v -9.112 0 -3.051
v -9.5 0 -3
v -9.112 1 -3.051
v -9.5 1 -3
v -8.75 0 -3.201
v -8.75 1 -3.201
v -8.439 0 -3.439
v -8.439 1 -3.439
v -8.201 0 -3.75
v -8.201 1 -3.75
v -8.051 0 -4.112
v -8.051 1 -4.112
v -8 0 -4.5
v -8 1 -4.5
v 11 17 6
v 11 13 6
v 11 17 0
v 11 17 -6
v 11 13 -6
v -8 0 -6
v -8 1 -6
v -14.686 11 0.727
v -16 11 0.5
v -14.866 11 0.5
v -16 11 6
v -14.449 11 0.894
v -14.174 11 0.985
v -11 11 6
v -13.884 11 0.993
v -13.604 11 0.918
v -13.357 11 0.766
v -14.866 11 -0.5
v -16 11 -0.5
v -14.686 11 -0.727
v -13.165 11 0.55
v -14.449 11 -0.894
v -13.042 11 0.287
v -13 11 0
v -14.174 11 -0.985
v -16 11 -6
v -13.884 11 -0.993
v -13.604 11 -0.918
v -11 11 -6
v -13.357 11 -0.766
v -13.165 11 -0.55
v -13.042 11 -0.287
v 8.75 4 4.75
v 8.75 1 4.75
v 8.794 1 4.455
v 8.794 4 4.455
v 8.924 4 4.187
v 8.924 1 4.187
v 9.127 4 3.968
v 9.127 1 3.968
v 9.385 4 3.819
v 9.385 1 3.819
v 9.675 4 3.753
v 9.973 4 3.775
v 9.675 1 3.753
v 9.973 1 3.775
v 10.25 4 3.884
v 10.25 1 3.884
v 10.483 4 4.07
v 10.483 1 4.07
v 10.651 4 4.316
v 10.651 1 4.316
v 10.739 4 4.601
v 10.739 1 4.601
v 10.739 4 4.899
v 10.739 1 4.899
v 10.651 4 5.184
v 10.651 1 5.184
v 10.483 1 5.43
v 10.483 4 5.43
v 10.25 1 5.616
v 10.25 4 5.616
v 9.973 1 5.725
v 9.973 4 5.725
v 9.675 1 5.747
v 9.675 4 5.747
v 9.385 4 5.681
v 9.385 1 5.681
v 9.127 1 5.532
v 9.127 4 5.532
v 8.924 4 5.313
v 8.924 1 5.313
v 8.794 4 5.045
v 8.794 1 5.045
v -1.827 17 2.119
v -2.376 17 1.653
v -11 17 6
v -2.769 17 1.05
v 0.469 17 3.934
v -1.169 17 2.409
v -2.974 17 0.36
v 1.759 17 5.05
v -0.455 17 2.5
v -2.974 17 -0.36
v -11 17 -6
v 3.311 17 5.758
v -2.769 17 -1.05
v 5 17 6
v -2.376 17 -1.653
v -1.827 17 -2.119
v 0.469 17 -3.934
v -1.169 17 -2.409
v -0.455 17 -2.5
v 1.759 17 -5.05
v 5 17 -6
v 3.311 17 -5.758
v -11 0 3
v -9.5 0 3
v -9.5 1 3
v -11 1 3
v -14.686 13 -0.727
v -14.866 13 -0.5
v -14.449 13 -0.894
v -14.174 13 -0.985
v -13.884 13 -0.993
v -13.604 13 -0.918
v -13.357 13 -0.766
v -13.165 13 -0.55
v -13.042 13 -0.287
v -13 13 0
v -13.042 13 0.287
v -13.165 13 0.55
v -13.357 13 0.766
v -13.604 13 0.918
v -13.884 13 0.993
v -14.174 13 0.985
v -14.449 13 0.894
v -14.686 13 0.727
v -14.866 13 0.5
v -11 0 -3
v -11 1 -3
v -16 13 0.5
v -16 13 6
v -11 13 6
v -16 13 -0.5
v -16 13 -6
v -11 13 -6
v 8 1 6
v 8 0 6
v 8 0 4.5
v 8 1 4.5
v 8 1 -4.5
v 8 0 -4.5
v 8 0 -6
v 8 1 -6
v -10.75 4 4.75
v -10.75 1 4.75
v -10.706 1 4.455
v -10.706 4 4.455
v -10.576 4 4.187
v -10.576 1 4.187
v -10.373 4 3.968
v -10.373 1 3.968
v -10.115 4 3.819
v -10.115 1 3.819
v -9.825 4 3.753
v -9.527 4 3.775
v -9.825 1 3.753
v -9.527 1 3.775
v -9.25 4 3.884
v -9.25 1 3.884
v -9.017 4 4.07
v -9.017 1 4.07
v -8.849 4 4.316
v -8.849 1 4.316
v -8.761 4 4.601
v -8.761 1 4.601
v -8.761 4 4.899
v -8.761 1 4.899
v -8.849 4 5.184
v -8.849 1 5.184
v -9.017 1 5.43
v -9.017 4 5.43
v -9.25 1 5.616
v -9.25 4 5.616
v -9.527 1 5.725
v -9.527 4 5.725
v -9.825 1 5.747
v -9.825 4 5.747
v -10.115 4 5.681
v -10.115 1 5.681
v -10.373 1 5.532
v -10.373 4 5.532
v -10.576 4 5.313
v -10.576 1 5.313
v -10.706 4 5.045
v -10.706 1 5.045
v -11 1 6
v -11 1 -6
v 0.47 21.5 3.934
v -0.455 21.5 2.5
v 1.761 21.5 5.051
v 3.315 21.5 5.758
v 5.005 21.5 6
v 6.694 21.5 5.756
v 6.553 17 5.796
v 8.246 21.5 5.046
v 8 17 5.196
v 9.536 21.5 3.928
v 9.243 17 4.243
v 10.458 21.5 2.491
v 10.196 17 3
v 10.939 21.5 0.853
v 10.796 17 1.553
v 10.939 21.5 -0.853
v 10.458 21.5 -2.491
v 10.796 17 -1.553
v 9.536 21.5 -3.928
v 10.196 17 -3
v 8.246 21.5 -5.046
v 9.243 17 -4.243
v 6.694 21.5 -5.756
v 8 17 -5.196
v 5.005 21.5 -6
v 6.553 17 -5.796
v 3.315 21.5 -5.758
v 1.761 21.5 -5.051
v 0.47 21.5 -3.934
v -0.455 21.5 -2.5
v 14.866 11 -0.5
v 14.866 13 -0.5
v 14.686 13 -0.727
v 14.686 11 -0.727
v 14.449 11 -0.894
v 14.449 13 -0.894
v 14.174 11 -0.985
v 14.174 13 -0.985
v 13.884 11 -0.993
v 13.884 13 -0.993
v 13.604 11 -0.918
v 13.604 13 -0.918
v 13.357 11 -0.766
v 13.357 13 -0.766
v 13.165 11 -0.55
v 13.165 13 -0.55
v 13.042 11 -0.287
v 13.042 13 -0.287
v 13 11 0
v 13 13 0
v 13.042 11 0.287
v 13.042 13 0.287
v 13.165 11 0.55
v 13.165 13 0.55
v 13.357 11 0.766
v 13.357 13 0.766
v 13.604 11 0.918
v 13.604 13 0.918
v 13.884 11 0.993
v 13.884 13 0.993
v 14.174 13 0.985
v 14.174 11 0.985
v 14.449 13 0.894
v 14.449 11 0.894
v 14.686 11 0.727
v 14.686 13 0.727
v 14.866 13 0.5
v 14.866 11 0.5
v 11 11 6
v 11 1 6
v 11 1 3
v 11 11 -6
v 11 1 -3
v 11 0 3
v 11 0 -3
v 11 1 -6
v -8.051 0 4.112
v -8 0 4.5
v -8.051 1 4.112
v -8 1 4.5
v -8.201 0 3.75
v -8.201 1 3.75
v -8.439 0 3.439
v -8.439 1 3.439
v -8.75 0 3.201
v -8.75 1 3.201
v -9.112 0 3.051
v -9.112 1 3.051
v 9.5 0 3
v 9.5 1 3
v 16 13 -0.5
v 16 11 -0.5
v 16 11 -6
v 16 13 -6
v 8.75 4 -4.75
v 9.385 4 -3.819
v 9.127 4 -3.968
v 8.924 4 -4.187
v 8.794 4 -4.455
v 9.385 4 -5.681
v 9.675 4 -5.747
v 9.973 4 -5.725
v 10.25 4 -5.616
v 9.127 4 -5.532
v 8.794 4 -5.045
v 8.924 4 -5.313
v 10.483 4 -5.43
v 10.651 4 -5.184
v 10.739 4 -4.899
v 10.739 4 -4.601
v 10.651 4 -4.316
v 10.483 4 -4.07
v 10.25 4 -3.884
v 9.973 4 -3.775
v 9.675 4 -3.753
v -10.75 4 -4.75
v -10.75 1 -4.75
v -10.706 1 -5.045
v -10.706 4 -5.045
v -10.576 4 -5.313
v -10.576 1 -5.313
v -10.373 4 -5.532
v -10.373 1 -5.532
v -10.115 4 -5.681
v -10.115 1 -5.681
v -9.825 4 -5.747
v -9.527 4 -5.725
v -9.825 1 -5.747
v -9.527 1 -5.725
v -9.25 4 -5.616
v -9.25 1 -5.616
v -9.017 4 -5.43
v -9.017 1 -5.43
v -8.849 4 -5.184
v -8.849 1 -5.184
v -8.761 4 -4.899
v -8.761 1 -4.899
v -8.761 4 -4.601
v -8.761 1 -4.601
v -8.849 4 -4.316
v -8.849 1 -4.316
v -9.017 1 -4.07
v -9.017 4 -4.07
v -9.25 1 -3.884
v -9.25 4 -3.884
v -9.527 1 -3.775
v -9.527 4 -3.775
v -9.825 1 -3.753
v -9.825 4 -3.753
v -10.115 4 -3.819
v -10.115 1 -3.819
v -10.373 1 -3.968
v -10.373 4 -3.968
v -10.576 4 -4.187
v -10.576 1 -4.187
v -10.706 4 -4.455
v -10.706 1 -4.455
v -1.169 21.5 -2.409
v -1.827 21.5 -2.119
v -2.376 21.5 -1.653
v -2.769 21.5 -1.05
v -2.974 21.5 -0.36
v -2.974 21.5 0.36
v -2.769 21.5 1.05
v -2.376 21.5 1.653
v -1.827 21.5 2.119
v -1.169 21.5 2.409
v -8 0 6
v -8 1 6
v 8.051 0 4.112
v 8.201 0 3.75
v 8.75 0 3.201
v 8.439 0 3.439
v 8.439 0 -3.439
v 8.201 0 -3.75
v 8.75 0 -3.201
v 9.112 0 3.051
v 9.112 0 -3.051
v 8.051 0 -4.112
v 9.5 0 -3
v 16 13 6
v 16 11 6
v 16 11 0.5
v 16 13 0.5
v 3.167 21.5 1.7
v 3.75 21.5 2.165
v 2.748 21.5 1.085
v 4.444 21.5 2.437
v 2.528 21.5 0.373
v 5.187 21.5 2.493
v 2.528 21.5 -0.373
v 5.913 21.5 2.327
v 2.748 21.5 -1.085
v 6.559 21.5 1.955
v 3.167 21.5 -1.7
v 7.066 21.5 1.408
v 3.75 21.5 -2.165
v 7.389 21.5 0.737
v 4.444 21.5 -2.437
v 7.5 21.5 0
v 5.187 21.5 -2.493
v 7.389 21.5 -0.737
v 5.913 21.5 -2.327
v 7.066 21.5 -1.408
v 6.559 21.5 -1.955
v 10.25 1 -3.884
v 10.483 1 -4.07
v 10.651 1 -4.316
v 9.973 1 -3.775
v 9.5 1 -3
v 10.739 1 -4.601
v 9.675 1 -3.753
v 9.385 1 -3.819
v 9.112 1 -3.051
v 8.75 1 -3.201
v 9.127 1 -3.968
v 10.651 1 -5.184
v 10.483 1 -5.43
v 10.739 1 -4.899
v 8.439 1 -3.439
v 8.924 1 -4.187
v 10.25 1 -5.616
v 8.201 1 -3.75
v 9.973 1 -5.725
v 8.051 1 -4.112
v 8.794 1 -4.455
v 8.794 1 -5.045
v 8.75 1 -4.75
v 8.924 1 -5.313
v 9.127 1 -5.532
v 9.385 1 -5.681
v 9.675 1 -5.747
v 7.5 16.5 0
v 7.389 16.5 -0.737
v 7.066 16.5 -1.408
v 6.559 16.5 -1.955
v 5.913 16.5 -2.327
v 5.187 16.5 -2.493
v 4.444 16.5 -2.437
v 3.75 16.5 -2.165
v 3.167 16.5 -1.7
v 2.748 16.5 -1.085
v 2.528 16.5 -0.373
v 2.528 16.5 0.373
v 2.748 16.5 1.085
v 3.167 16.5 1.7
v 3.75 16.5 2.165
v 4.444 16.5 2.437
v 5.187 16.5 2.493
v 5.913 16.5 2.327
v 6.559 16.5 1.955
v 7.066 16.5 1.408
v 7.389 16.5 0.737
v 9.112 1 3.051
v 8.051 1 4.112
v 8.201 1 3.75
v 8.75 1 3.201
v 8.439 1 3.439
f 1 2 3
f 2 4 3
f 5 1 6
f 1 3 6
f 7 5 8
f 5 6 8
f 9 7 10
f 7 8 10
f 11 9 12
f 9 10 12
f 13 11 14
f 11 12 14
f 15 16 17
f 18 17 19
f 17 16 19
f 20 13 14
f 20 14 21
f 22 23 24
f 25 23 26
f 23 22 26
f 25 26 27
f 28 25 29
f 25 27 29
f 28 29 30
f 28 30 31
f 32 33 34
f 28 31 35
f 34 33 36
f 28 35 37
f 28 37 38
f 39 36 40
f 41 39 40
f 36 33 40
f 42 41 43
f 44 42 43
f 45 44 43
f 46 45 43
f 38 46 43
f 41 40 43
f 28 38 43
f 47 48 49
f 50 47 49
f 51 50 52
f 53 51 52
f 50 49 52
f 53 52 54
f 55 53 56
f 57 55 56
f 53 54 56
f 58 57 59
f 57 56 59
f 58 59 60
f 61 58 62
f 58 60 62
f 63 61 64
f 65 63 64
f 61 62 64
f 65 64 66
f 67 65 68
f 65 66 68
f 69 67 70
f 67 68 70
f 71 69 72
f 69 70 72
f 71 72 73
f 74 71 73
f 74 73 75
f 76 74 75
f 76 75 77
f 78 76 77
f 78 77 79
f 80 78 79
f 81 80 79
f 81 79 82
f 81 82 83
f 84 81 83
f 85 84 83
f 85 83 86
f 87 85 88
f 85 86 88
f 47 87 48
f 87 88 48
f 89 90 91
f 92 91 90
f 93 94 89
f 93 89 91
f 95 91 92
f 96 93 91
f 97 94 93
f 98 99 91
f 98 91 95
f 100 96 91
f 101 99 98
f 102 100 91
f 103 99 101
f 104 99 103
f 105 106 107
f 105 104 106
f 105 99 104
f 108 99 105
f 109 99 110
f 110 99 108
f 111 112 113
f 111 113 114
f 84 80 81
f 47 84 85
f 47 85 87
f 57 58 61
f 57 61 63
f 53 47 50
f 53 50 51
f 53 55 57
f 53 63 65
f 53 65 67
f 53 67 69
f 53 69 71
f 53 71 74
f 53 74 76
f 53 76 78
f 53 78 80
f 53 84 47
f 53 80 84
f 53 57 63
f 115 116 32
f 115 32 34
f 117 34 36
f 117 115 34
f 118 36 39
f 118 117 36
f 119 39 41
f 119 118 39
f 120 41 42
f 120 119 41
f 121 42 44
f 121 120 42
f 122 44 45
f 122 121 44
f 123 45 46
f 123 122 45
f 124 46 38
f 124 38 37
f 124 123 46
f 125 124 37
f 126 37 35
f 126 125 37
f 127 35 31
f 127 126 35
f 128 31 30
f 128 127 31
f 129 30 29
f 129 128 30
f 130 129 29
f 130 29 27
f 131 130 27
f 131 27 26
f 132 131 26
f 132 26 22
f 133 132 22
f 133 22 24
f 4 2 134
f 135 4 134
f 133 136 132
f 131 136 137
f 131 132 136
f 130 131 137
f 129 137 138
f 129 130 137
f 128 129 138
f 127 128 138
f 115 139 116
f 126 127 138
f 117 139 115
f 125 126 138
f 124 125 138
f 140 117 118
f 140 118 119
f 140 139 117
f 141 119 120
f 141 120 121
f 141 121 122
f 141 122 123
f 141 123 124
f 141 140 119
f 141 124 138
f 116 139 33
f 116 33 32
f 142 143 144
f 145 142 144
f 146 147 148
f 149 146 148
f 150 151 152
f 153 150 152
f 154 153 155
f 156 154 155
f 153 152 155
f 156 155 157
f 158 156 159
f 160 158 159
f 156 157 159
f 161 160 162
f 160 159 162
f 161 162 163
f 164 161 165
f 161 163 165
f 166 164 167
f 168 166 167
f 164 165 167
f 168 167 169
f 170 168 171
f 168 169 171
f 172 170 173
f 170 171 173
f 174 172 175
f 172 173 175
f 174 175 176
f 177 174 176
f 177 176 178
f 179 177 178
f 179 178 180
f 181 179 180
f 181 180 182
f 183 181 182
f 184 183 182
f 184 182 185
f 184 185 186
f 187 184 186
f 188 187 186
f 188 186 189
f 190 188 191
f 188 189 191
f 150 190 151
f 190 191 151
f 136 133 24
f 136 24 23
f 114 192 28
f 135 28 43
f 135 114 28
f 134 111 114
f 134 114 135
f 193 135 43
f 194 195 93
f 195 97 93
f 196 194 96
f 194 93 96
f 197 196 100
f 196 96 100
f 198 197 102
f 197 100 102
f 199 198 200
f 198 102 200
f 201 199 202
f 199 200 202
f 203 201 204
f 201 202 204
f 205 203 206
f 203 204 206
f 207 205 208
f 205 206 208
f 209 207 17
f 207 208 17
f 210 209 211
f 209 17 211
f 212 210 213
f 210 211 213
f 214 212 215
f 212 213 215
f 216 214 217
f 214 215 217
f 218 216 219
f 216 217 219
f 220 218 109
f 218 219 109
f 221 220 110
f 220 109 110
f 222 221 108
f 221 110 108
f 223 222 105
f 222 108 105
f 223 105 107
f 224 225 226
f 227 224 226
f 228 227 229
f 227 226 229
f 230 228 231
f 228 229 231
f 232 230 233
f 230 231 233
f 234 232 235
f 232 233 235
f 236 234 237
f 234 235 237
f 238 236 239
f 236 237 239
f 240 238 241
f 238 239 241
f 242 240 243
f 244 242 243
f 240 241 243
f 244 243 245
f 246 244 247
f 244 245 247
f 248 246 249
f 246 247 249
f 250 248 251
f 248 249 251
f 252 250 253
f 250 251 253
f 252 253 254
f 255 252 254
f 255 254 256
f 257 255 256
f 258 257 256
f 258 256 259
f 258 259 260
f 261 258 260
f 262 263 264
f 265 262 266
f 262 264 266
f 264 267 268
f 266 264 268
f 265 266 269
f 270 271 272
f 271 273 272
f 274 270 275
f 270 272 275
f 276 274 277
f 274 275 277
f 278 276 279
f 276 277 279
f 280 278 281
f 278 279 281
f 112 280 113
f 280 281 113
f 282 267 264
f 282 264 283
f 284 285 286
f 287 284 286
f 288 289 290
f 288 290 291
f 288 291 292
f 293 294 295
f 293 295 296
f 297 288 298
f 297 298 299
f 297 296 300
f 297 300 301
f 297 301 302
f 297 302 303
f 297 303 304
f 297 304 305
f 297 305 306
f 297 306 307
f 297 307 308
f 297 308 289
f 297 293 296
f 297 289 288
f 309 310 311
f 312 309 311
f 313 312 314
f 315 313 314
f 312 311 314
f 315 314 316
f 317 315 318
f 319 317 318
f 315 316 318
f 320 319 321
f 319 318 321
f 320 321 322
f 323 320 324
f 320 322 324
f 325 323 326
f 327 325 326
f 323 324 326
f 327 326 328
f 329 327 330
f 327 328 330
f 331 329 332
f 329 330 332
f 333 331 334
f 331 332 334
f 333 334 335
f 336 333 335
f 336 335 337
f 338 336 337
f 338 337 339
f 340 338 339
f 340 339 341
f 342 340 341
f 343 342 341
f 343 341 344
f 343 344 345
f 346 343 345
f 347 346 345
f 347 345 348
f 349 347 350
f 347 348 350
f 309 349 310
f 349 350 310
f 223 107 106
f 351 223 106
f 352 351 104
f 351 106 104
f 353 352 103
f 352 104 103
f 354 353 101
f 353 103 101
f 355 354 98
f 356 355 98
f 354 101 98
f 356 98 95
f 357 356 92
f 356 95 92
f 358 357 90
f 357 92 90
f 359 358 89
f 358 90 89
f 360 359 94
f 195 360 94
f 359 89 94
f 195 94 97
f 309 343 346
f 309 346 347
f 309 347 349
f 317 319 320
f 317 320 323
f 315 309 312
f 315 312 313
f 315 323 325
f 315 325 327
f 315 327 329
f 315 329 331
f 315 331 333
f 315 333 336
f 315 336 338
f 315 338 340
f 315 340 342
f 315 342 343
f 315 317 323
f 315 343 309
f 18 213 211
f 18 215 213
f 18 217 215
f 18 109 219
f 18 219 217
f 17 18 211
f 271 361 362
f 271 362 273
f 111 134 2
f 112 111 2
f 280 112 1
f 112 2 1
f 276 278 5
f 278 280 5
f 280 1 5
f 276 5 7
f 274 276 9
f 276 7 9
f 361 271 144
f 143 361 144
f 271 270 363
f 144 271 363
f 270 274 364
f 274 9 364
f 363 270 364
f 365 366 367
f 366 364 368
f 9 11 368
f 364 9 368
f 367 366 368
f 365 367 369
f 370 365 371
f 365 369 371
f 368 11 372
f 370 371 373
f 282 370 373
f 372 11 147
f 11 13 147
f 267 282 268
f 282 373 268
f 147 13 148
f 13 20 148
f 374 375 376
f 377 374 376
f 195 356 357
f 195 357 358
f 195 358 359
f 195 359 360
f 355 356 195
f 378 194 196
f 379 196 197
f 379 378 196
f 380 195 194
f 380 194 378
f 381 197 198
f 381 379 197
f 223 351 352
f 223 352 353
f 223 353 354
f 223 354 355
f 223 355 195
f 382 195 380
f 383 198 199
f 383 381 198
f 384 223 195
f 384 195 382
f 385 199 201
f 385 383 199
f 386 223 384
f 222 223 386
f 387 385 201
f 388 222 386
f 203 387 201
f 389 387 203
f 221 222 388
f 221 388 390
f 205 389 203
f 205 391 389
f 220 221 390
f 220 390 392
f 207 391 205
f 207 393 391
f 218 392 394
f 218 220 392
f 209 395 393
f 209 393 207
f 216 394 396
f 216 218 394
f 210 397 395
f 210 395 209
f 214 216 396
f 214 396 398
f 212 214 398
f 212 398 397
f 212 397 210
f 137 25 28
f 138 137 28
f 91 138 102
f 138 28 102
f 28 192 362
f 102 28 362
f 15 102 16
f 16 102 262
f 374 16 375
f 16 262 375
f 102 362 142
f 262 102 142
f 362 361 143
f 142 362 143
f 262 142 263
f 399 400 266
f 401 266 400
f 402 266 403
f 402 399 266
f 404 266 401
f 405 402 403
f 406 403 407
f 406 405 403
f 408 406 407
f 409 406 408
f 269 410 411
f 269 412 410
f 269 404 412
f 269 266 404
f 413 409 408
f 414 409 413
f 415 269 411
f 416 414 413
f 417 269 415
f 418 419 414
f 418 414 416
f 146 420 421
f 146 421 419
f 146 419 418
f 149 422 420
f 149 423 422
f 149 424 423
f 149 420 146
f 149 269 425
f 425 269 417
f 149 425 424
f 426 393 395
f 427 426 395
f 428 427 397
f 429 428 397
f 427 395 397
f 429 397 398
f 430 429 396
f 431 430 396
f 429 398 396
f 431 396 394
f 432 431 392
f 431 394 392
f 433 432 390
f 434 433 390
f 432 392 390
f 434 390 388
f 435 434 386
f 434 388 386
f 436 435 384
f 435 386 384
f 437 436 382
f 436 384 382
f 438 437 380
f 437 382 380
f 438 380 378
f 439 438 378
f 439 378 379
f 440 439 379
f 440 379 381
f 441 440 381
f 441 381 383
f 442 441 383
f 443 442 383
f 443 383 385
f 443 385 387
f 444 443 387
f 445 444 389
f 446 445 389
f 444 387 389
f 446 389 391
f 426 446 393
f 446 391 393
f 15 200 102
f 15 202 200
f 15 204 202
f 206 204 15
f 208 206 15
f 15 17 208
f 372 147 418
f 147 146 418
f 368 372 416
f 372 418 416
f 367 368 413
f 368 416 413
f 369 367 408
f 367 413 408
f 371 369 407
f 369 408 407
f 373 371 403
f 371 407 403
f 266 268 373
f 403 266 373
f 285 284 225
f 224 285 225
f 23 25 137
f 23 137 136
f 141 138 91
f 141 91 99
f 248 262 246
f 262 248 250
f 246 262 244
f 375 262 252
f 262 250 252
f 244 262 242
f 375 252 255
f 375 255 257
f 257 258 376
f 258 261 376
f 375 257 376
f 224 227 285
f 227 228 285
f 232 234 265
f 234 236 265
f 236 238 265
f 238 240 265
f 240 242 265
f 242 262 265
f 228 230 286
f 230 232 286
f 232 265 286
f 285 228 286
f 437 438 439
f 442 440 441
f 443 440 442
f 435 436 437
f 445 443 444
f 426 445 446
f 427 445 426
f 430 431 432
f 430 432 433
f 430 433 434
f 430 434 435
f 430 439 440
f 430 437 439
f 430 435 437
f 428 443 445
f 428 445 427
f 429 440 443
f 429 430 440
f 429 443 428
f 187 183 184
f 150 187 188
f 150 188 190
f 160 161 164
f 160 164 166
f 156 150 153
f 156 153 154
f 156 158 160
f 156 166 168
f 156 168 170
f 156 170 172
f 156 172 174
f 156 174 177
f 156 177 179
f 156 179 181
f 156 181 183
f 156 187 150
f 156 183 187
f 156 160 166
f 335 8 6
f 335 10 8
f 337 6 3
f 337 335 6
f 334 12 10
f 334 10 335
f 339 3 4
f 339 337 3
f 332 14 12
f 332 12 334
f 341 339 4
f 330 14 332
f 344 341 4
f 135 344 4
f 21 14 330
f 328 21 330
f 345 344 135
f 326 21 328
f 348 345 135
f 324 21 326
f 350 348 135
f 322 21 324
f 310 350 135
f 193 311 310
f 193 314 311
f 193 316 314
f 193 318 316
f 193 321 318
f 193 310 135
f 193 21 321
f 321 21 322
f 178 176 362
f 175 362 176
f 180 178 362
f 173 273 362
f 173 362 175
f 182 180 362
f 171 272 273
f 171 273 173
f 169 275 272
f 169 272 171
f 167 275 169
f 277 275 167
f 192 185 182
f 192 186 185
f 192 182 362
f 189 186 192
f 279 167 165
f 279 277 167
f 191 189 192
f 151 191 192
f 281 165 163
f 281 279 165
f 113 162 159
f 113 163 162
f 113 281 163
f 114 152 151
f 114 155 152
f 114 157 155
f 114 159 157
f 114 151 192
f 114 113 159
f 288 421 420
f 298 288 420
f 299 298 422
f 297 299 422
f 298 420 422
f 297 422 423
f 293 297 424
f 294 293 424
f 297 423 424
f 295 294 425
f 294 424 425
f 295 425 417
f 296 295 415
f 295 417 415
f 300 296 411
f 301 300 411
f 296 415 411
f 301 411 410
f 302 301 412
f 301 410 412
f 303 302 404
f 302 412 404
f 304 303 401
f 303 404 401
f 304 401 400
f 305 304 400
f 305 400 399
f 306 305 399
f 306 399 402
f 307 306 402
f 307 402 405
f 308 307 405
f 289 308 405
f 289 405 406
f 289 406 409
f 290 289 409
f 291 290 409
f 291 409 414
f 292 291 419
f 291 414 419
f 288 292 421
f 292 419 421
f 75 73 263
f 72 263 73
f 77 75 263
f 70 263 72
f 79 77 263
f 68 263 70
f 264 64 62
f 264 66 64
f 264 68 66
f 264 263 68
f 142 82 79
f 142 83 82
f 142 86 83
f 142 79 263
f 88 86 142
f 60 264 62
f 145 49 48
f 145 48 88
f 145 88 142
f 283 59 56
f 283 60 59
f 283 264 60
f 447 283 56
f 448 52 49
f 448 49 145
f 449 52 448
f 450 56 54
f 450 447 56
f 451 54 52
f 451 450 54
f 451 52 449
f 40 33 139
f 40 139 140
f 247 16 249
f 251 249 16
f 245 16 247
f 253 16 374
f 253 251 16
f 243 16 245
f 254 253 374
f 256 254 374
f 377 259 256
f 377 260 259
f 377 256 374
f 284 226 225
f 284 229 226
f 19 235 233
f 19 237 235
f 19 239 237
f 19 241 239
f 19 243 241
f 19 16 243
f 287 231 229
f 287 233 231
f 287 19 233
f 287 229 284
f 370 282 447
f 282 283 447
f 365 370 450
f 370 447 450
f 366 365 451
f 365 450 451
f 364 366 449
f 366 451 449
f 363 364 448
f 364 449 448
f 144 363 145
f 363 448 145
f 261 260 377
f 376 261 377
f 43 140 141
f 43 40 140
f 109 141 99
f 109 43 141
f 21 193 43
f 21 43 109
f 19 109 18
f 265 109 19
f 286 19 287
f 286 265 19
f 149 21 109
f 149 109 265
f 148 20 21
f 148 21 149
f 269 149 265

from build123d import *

# Parameters (mm, degrees)
CROQUIS1_W              = 22
CROQUIS1_H              = 12
SALIENTE_EXTRUIR1_DEPTH = 11
CROQUIS3_W              = 10
CROQUIS3_H              = 12
SALIENTE_EXTRUIR2_DEPTH = 2
CROQUIS4_W              = 12
CROQUIS4_H              = 12
SALIENTE_EXTRUIR3_DEPTH = 6
CORTAR_EXTRUIR1_DEPTH   = 2
CROQUIS6_W              = 5
CROQUIS6_H              = 12
SALIENTE_EXTRUIR4_DEPTH = 4
CORTAR_EXTRUIR2_DEPTH   = 4
CROQUIS8_R              = 6
SALIENTE_EXTRUIR5_DEPTH = 4.5
SALIENTE_EXTRUIR6_DEPTH = 4.5
CROQUIS10_W             = 3
CROQUIS10_H             = 3
CORTAR_EXTRUIR3_DEPTH   = 1
REDONDEO1_R             = 1.5
CROQUIS11_W             = 3
CROQUIS11_H             = 3
CORTAR_EXTRUIR4_DEPTH   = 1
REDONDEO3_R             = 1.5
CROQUIS12_R             = 1
CORTAR_EXTRUIR5_DEPTH   = 3
CROQUIS13_R             = 2.5
CORTAR_EXTRUIR6_DEPTH   = 5


with BuildPart() as part:
    # Croquis1 → Saliente-Extruir1 (new body)
    with BuildSketch(Plane(origin=(0, 0, 0), x_dir=(1, 0, 0), z_dir=(0, 1, 0))):
        Rectangle(CROQUIS1_W, CROQUIS1_H)
    extrude(amount=SALIENTE_EXTRUIR1_DEPTH)

    # Croquis3 → Saliente-Extruir2 (add)
    with BuildSketch(Plane(origin=(0, 11, 0), x_dir=(1, 0, 0), z_dir=(0, 1, 0))):
        with Locations((-11, 0)):
            Rectangle(CROQUIS3_W, CROQUIS3_H)
        with Locations((11, 0)):
            Rectangle(CROQUIS3_W, CROQUIS3_H)
    extrude(amount=SALIENTE_EXTRUIR2_DEPTH)

    # Croquis4 → Saliente-Extruir3 (add)
    with BuildSketch(Plane(origin=(0, 11, 0), x_dir=(1, 0, 0), z_dir=(0, 1, 0))):
        Rectangle(CROQUIS4_W, CROQUIS4_H)
    extrude(amount=SALIENTE_EXTRUIR3_DEPTH)

    # Croquis5 → Cortar-Extruir1 (cut)
    with BuildSketch(Plane(origin=(0, 13, 0), x_dir=(1, 0, 0), z_dir=(0, 1, 0))):
        with BuildLine():
            Line((-16, 0), (-16, 0.5))
            Line((-16, 0.5), (-15, 0.5))
            Line((-15, 0.5), (-14.866025404, 0.5))
            ThreePointArc((-14.866025404, 0.5), (-13, 0), (-14.866025404, -0.5))
            Line((-14.866025404, -0.5), (-15, -0.5))
            Line((-15, -0.5), (-15.911665796, -0.5))
            Line((-15.911665796, -0.5), (-16, -0.5))
            Line((-16, -0.5), (-16, 0))
        make_face()
    extrude(amount=-CORTAR_EXTRUIR1_DEPTH, mode=Mode.SUBTRACT)

    # Croquis6 → Saliente-Extruir4 (add)
    with BuildSketch(Plane(origin=(0, 13, 0), x_dir=(1, 0, 0), z_dir=(0, 1, 0))):
        with Locations((-8.5, 0)):
            Rectangle(CROQUIS6_W, CROQUIS6_H)
        with Locations((8.5, 0)):
            Rectangle(CROQUIS6_W, CROQUIS6_H)
    extrude(amount=SALIENTE_EXTRUIR4_DEPTH)

    # Croquis7 → Cortar-Extruir2 (cut)
    with BuildSketch(Plane(origin=(0, 13, 0), x_dir=(1, 0, 0), z_dir=(0, 1, 0))):
        with BuildLine():
            Line((16, 0), (16, 0.5))
            Line((16, 0.5), (14.906951689, 0.5))
            Line((14.906951689, 0.5), (14.866025404, 0.5))
            ThreePointArc((14.866025404, 0.5), (13, 0), (14.866025404, -0.5))
            Line((14.866025404, -0.5), (15, -0.5))
            Line((15, -0.5), (16, -0.5))
            Line((16, -0.5), (16, 0))
        make_face()
    extrude(amount=-CORTAR_EXTRUIR2_DEPTH, mode=Mode.SUBTRACT)

    # Croquis8 → Saliente-Extruir5 (add)
    with BuildSketch(Plane(origin=(0, 17, 0), x_dir=(1, 0, 0), z_dir=(0, 1, 0))):
        with Locations((5, 0)):
            Circle(CROQUIS8_R)
    extrude(amount=SALIENTE_EXTRUIR5_DEPTH)

    # Croquis9 → Saliente-Extruir6 (add)
    with BuildSketch(Plane(origin=(0, 17, 0), x_dir=(1, 0, 0), z_dir=(0, 1, 0))):
        with BuildLine():
            ThreePointArc((-0.454545455, -2.499586743), (-1, 0), (-0.454545455, 2.499586743))
            ThreePointArc((-0.454545455, 2.499586743), (-3, 0), (-0.454545455, -2.499586743))
        make_face()
    extrude(amount=SALIENTE_EXTRUIR6_DEPTH)

    # Croquis10 → Cortar-Extruir3 (cut)
    with BuildSketch(Plane(origin=(0, 0, 0), x_dir=(-1, 0, 0), z_dir=(0, -1, 0))):
        with Locations((9.5, -4.5)):
            Rectangle(CROQUIS10_W, CROQUIS10_H)
    extrude(amount=-CORTAR_EXTRUIR3_DEPTH, mode=Mode.SUBTRACT)

    # Redondeo1
    redondeo1_edges = [part.edges().sort_by_distance(p)[0] for p in [
        (-8, 0.5, 3),
    ]]
    fillet(redondeo1_edges, radius=REDONDEO1_R)

    # Croquis11 → Cortar-Extruir4 (cut)
    with BuildSketch(Plane(origin=(0, 0, 0), x_dir=(-1, 0, 0), z_dir=(0, -1, 0))):
        with Locations((9.5, 4.5)):
            Rectangle(CROQUIS11_W, CROQUIS11_H)
        with Locations((-9.5, -4.5)):
            Rectangle(CROQUIS11_W, CROQUIS11_H)
        with Locations((-9.5, 4.5)):
            Rectangle(CROQUIS11_W, CROQUIS11_H)
    extrude(amount=-CORTAR_EXTRUIR4_DEPTH, mode=Mode.SUBTRACT)

    # Redondeo3
    redondeo3_edges = [part.edges().sort_by_distance(p)[0] for p in [
        (-8, 0.5, -3),
        (8, 0.5, 3),
        (8, 0.5, -3),
    ]]
    fillet(redondeo3_edges, radius=REDONDEO3_R)

    # Croquis12 → Cortar-Extruir5 (cut)
    with BuildSketch(Plane(origin=(0, 1, 0), x_dir=(-1, 0, 0), z_dir=(0, -1, 0))):
        with Locations((9.75, -4.75)):
            Circle(CROQUIS12_R)
        with Locations((9.75, 4.75)):
            Circle(CROQUIS12_R)
        with Locations((-9.75, -4.75)):
            Circle(CROQUIS12_R)
        with Locations((-9.75, 4.75)):
            Circle(CROQUIS12_R)
    extrude(amount=-CORTAR_EXTRUIR5_DEPTH, mode=Mode.SUBTRACT)

    # Croquis13 → Cortar-Extruir6 (cut)
    with BuildSketch(Plane(origin=(0, 21.5, 0), x_dir=(1, 0, 0), z_dir=(0, 1, 0))):
        with Locations((5, 0)):
            Circle(CROQUIS13_R)
    extrude(amount=-CORTAR_EXTRUIR6_DEPTH, mode=Mode.SUBTRACT)


solid = part.part
